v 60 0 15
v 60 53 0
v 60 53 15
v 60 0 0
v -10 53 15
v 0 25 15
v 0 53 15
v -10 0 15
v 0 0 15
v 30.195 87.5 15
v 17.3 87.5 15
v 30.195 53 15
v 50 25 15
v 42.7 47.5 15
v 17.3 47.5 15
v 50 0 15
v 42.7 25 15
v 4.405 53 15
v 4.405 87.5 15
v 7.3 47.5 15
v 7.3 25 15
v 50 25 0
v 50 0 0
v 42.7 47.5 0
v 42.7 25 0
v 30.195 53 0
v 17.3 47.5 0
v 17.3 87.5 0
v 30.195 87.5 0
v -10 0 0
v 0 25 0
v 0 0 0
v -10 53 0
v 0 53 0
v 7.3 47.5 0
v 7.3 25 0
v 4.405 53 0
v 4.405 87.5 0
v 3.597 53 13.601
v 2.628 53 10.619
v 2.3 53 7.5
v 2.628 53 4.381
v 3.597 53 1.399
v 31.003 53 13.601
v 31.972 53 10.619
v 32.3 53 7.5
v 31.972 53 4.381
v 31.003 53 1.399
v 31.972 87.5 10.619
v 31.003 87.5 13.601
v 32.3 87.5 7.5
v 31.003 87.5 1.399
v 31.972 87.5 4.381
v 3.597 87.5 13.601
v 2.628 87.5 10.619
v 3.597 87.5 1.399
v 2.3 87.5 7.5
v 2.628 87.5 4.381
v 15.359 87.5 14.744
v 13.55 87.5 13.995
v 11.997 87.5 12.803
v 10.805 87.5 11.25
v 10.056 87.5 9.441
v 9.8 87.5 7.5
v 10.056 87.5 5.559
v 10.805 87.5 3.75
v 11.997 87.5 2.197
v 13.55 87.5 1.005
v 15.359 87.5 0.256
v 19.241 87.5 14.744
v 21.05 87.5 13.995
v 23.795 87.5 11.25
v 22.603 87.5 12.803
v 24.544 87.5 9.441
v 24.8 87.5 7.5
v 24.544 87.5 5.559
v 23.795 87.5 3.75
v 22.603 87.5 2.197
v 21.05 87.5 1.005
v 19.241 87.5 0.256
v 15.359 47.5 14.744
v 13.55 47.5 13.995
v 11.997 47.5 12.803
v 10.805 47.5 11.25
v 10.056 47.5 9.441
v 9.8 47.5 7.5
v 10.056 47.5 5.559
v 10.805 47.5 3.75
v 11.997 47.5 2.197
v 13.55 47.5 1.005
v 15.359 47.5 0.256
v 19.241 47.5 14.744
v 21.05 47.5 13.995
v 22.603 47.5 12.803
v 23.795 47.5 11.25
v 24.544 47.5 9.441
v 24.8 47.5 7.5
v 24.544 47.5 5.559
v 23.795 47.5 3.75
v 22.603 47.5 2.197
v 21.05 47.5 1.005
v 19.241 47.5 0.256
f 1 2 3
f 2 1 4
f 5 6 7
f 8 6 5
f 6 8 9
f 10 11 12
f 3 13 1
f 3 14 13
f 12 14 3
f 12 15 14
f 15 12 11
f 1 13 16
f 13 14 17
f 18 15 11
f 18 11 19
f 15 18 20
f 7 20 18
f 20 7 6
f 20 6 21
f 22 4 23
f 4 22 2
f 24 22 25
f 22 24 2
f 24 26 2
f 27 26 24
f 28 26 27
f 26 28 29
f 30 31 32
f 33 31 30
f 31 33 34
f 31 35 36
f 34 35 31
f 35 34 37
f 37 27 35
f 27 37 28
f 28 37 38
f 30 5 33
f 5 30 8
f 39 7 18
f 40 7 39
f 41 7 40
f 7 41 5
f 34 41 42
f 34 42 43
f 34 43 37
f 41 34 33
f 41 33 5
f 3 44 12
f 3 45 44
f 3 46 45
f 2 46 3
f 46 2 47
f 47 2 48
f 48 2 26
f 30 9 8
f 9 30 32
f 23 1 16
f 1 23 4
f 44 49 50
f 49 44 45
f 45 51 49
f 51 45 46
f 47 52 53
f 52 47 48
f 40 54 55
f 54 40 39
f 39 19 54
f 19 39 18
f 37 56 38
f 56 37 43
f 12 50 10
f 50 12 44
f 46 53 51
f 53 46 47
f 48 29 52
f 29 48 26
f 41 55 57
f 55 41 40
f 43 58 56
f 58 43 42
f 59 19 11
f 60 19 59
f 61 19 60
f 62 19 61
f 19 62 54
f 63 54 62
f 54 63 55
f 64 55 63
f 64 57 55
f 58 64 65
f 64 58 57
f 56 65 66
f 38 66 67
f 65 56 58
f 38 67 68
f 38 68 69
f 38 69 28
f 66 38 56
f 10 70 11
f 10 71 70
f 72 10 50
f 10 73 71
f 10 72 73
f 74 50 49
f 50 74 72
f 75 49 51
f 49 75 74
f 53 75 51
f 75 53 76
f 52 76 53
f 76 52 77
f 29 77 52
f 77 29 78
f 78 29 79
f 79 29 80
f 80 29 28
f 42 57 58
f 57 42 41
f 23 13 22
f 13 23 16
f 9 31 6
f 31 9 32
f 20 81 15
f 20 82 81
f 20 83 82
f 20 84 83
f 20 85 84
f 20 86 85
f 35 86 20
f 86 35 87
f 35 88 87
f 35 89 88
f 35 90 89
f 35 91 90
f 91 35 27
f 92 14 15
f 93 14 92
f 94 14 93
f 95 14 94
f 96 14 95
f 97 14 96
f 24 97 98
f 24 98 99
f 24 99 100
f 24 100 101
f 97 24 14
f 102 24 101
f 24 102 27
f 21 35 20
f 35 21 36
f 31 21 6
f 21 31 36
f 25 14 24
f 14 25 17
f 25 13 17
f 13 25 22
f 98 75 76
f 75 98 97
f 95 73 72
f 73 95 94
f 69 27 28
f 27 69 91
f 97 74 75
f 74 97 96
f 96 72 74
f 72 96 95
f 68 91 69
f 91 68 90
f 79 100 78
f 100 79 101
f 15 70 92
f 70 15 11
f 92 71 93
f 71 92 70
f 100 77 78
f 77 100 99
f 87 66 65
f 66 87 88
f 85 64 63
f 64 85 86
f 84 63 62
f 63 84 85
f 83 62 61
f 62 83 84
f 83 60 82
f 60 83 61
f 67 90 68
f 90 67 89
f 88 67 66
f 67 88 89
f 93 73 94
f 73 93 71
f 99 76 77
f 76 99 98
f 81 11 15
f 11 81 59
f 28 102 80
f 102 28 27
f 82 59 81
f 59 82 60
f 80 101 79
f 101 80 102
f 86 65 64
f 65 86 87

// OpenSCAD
difference() {
    union() {
        translate([-10,0,0])
        cube([70, 53, 15]);
        translate([7.3 + 10, 47.5 + 40, 7.5])
        rotate([90, 0, 0])
        cylinder(r = 15, h= 80);
    }
    difference() {
        cube([50, 47.5, 15]);
        translate([0, 25, 0])
        cube([7.3, 22.5, 15]);
        translate([50-7.3, 25, 0])
        cube([7.3, 22.5, 15]);
    }
    
    translate([7.3 + 10, 47.5 + 100, 7.5])
    rotate([90, 0, 0])
    cylinder(r = 7.5, h= 200);
    
    translate([0,0,-100])
    cube([100, 100, 100]);
    
    translate([0,0,15])
    cube([100, 100, 100]);
}
